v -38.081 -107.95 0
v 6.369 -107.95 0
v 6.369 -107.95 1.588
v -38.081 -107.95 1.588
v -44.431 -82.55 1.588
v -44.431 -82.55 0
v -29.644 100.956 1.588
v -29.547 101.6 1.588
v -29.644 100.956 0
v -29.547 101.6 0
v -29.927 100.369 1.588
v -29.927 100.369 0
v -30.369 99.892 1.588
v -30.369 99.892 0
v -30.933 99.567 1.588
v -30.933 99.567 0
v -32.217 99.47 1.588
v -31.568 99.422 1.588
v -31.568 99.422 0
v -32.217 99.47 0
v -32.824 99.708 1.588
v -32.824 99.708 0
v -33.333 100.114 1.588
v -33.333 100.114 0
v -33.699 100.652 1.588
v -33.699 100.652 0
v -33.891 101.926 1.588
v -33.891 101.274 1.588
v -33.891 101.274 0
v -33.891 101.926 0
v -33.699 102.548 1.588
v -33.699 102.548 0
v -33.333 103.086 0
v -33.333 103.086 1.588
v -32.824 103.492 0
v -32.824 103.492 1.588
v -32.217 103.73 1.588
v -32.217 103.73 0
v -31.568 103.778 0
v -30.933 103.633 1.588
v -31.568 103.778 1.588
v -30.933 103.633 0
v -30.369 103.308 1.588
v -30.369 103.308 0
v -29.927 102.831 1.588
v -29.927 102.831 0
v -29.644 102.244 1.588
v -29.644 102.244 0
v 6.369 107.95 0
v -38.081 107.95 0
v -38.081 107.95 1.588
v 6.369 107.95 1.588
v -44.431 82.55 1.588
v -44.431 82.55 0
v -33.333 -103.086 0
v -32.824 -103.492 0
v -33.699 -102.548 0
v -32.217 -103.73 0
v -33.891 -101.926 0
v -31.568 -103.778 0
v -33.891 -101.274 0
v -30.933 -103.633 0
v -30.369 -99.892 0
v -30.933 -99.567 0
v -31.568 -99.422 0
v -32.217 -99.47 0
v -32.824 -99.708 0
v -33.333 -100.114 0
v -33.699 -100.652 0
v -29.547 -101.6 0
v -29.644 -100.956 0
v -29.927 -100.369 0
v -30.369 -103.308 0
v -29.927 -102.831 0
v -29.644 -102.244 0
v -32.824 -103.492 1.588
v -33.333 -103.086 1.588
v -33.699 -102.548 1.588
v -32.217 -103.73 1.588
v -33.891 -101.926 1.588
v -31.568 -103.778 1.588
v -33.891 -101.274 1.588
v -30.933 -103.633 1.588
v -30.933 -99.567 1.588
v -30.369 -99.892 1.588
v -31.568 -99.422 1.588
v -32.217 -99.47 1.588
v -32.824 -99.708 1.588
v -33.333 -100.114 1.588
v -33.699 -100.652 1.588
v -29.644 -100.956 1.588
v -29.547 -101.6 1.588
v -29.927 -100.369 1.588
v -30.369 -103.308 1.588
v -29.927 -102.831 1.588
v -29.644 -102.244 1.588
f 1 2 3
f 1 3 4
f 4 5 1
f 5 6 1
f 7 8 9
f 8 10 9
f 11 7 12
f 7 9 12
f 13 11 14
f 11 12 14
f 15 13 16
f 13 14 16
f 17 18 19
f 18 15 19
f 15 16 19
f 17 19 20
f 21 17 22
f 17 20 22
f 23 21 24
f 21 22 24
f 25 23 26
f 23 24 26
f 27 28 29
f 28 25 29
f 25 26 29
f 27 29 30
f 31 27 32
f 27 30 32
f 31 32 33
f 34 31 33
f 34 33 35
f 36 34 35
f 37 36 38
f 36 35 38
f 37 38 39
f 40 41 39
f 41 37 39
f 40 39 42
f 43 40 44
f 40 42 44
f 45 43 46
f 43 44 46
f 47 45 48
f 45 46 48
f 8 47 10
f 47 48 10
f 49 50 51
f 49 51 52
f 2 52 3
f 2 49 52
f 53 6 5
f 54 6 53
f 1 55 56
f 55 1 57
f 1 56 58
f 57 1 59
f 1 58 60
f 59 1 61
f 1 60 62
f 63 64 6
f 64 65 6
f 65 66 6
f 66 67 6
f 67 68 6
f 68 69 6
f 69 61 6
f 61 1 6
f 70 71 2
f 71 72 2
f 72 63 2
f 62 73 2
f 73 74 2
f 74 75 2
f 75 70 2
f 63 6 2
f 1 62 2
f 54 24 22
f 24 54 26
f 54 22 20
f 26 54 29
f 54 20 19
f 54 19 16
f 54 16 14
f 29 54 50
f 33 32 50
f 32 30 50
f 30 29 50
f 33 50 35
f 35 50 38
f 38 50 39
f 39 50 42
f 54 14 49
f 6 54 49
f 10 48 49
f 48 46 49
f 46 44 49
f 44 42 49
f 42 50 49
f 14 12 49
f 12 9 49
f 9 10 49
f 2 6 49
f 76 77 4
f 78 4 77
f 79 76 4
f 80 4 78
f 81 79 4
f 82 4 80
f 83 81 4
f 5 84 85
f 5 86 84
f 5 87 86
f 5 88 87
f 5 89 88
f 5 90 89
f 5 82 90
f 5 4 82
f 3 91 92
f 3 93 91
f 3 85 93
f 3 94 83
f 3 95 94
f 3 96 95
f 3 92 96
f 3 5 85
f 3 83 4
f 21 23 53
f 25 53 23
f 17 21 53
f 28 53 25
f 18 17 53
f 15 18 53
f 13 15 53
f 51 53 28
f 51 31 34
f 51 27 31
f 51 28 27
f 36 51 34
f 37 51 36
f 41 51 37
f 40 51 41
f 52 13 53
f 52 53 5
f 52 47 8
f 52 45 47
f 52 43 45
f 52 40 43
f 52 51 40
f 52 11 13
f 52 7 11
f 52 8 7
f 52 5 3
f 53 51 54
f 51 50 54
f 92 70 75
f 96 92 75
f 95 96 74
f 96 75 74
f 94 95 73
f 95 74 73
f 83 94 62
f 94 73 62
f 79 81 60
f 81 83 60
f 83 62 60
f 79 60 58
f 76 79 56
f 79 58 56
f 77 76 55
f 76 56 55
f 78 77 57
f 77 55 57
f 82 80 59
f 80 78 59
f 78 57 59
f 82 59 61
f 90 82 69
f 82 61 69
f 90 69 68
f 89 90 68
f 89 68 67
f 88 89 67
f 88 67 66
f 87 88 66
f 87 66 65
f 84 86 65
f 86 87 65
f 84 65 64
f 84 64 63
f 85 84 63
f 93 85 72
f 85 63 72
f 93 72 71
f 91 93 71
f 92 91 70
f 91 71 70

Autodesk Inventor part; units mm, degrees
ref_plane "YZ Plane" through (0, 0, 0) normal (1, 0, 0) x (0, 1, 0)
ref_plane "XZ Plane" through (0, 0, 0) normal (0, 1, 0) x (-1, 0, 0)
ref_plane "XY Plane" through (0, 0, 0) normal (0, 0, 1) x (1, 0, 0)
sketch "Sketch1" plane through (0, 0, 0) normal (0, 0, 1) x (1, 0, 0)
  line L0 (3.9874, -107.95) -> (-5.3154, -107.95) construction
  line L1 (6.3686, -83.7157) -> (6.3686, -107.95) construction
  line L2 (6.3686, -107.95) -> (-38.0814, -107.95)
  line L3 (-44.4314, -82.55) -> (-44.4314, 82.55)
  line L4 (-38.0814, 107.95) -> (6.3686, 107.95)
  line L5 (6.3686, 107.95) -> (6.3686, -107.95)
  line L6 (-44.4314, -107.95) -> (-38.0814, -107.95) construction
  line L7 (-44.4314, -107.95) -> (-44.4314, -82.55) construction
  line L8 (-44.4314, 107.95) -> (-38.0814, 107.95) construction
  line L9 (-44.4314, 107.95) -> (-44.4314, 82.55) construction
  line L10 (-38.0814, 107.95) -> (-44.4314, 82.55)
  line L11 (-44.4314, -82.55) -> (-38.0814, -107.95)
  line L12 (-44.4314, 107.95) -> (-44.4314, 101.6) construction
  line L13 (-44.4314, 107.95) -> (-31.7314, 107.95) construction
  line L14 (-44.4314, -107.95) -> (-31.7314, -107.95) construction
  line L15 (-44.4314, -107.95) -> (-44.4314, -101.6) construction
  circle A0 centre (-31.7314, -101.6) radius 2.1844
  circle A1 centre (-31.7314, 101.6) radius 2.1844
  point P0 (0, 0)
  dimension "d0" = 50.8
  dimension "d1" = 215.9
  dimension "d2" = 6.35
  dimension "d3" = 25.4
  dimension "d4" = 6.35
  dimension "d5" = 25.4
  dimension "d8" = 6.35
  dimension "d9" = 12.7
  dimension "d10" = 12.7
  dimension "d11" = 6.35
  dimension "d12" = 4.3688
  dimension "d13" = 4.3688
extrude "Extrusion1" add sketch "Sketch1" along normal blind 1.5875
properties part number "Angle changer polycarb"
